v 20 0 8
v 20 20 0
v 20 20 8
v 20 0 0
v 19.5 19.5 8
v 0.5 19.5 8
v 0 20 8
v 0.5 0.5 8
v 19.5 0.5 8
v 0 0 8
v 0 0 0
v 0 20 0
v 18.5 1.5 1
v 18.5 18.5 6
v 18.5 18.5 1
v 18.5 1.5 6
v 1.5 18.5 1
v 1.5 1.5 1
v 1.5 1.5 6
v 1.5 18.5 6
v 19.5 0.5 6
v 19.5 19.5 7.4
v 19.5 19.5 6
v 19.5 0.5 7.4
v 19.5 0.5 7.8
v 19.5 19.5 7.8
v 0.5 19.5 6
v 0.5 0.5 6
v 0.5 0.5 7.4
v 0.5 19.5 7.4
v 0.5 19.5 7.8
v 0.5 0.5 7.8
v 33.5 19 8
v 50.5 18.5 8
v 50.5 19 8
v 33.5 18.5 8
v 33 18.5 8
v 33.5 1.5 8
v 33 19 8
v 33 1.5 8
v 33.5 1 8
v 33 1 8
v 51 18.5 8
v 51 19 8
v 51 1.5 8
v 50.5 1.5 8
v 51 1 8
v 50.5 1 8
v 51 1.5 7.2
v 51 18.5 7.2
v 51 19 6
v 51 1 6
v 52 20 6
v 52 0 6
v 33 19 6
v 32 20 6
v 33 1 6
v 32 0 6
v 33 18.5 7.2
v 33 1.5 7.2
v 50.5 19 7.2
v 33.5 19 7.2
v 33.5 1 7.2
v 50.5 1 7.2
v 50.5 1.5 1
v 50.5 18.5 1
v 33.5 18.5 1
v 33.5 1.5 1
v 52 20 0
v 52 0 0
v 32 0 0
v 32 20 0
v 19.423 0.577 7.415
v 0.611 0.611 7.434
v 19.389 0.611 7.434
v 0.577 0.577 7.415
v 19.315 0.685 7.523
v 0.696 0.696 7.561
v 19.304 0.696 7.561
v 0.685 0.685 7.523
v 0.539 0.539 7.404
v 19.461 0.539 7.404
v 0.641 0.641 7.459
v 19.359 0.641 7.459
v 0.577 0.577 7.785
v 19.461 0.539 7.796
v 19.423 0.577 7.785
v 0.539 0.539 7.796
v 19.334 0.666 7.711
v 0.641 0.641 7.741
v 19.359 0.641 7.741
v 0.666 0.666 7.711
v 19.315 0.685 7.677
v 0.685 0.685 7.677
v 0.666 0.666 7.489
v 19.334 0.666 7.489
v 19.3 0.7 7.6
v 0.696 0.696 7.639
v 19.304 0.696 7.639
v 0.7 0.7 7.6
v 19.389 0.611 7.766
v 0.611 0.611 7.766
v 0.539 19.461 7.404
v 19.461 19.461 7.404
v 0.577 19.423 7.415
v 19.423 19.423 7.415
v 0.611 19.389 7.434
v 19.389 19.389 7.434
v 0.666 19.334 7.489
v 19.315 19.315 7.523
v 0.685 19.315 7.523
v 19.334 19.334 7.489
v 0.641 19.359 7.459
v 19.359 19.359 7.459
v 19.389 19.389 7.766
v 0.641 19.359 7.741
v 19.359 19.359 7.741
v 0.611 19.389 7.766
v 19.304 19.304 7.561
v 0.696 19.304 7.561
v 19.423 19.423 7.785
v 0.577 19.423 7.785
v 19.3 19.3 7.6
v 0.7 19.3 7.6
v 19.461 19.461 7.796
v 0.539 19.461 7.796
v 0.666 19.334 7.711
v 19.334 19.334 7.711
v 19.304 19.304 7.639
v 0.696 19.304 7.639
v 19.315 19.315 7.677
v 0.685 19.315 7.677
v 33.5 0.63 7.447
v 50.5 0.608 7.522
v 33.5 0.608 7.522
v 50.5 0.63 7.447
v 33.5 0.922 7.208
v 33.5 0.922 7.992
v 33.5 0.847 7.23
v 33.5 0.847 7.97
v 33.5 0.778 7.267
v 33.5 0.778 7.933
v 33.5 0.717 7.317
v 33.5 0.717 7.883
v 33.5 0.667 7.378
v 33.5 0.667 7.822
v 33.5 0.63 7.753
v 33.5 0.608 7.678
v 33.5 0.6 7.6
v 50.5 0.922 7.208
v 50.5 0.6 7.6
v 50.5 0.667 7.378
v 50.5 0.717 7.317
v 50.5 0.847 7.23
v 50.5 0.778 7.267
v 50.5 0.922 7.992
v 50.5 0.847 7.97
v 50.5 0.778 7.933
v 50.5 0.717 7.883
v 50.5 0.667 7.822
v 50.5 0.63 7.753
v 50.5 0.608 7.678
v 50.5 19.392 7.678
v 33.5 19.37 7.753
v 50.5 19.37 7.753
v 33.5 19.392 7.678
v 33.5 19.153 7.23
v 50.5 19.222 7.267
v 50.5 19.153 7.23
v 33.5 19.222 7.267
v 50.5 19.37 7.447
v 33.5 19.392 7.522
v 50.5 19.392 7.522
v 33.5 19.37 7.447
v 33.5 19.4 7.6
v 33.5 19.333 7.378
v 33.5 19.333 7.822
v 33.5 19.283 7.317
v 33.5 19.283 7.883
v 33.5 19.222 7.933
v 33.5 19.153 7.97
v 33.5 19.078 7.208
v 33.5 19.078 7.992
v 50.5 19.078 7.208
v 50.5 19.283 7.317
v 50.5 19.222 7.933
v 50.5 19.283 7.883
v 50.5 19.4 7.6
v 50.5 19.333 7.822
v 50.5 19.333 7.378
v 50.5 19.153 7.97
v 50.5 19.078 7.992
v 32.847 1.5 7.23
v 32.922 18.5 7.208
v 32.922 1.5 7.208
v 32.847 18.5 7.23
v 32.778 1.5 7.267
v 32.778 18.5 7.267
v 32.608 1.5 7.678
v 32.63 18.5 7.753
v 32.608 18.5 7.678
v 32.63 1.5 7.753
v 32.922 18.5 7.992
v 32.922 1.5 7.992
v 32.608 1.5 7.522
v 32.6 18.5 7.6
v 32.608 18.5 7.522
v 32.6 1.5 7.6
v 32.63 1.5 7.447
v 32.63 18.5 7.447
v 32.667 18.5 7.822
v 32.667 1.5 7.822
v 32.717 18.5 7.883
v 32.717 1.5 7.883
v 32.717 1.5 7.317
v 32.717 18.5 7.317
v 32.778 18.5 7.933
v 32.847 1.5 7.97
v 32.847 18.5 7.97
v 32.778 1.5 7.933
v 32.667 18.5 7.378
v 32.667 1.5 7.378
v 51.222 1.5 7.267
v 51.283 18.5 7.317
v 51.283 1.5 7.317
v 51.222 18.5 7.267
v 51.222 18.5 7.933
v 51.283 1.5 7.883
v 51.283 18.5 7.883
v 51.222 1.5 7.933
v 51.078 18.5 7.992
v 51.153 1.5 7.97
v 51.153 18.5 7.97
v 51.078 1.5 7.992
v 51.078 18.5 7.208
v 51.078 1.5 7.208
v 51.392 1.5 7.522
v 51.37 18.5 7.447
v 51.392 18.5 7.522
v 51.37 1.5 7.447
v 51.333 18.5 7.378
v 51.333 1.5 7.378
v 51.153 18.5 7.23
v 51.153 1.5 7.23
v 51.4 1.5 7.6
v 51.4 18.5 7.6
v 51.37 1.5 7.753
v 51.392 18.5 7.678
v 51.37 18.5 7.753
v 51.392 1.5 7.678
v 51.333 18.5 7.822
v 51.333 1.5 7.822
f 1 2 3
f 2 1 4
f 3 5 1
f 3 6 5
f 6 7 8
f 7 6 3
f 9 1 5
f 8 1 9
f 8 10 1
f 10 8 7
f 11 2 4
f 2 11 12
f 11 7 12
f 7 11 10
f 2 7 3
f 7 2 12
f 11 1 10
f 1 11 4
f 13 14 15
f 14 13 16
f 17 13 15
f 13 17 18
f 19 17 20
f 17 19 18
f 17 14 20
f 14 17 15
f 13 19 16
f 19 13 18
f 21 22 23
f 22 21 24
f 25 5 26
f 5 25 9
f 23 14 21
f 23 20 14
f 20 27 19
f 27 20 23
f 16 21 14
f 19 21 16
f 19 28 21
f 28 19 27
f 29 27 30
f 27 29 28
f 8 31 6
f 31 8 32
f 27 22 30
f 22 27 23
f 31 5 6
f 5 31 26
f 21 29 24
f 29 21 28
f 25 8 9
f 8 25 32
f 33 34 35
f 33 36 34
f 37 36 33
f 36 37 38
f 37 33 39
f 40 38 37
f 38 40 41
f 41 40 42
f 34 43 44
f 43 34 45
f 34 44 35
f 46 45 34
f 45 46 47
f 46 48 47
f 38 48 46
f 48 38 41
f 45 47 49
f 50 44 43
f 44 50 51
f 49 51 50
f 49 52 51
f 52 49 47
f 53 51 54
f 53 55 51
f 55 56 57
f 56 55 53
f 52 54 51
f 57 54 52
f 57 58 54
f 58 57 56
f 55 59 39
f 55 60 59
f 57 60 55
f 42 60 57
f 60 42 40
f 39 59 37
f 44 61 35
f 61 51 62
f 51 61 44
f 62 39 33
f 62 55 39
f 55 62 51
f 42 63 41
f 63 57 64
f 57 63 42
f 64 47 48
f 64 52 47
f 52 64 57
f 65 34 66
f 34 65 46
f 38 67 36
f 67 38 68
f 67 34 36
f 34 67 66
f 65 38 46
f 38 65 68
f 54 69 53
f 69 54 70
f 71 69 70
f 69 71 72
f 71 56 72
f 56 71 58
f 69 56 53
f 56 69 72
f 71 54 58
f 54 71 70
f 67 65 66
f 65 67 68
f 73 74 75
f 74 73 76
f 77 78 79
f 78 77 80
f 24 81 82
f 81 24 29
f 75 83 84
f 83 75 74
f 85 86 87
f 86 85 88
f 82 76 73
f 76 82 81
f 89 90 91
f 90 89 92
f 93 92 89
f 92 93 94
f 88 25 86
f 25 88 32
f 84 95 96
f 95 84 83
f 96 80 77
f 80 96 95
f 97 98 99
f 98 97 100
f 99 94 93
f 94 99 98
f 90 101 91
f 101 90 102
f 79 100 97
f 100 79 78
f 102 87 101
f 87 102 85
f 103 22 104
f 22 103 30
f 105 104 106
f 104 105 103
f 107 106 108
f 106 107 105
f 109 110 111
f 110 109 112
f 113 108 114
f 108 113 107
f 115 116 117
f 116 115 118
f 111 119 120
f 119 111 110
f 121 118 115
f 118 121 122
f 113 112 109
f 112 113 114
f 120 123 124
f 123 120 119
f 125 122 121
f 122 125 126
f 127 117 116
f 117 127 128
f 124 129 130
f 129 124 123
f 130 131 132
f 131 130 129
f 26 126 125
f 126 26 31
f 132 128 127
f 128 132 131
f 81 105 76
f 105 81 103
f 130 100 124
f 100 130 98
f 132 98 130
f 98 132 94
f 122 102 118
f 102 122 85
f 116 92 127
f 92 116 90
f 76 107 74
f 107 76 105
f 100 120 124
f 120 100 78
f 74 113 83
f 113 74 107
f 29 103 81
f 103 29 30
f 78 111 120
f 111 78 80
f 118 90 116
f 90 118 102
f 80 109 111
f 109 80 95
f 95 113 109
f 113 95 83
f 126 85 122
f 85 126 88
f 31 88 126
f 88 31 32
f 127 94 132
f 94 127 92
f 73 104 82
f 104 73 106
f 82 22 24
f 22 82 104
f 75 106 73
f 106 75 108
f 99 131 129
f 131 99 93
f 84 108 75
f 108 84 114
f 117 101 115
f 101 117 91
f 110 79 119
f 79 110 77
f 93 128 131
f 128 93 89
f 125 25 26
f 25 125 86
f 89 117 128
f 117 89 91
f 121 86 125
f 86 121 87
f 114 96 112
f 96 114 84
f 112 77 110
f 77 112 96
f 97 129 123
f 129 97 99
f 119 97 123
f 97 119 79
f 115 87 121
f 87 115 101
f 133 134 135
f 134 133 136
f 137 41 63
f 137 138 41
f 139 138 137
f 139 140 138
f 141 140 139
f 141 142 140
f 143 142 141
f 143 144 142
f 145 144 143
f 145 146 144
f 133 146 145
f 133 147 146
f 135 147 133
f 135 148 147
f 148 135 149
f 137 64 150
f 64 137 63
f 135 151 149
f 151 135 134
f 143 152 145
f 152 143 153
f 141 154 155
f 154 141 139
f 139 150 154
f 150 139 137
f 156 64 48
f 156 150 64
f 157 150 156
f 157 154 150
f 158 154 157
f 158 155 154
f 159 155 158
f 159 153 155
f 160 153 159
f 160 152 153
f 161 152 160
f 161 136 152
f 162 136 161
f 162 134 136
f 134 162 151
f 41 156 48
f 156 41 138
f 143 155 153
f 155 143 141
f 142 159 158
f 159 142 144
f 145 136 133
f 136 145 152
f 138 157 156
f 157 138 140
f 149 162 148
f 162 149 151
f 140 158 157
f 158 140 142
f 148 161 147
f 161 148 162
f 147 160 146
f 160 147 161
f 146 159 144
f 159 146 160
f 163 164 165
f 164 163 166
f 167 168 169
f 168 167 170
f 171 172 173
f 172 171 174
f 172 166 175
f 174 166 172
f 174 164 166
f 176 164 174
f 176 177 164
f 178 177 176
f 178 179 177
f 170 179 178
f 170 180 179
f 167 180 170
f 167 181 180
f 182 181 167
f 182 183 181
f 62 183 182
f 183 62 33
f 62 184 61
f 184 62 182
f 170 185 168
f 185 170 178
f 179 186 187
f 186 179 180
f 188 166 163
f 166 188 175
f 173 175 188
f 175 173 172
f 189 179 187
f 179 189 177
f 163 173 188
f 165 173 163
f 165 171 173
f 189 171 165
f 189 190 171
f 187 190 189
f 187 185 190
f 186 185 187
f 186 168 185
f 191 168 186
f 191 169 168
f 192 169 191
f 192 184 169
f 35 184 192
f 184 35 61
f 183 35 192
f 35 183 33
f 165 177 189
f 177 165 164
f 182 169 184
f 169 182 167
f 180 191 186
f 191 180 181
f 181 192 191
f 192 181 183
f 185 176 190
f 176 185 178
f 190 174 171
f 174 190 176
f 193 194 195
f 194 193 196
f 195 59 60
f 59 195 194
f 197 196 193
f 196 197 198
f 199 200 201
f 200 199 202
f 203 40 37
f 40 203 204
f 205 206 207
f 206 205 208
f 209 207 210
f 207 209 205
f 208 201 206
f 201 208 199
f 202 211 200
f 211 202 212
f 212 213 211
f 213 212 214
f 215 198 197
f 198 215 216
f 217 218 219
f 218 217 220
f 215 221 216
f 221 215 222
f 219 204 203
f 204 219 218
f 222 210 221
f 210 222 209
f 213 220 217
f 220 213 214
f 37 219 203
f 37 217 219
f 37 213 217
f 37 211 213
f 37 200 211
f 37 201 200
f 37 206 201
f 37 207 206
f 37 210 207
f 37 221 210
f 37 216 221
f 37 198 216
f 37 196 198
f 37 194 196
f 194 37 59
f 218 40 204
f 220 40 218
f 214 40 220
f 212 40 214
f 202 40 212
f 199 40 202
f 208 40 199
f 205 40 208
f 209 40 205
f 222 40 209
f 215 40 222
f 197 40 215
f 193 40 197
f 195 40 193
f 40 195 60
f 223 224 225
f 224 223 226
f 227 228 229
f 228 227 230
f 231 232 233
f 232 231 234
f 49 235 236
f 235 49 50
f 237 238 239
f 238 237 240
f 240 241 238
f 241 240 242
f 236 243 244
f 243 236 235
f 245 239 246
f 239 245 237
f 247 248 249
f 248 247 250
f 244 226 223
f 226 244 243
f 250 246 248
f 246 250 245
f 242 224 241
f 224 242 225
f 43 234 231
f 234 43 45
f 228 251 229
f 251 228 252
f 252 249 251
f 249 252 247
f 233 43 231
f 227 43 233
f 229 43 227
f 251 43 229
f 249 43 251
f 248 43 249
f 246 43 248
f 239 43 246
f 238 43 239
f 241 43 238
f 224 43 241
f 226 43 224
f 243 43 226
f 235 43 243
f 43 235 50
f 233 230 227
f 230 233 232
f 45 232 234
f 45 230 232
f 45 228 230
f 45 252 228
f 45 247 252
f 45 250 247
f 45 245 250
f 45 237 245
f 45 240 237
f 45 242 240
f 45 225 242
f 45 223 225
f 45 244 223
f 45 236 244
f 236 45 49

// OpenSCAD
$fn = 32;

difference() {
    cube([20,20,8]);
    translate([1.5,1.5,1])
    cube([17,17,18]);
    translate([0.5,0.5,6])
    cube([19,19,9]);
}

module thing() {
    intersection() {
        cube([20,20,8]);
        translate([1,1,6])
        cube([18,18,2]);
    }
}

translate([32,0,0])
difference() {
    thing();
    translate([1.5,1.5,0])
    cube([17,17,20]);
}


translate([32,0,0])
difference() {
    cube([20,20,6]);
    translate([1.5,1.5,1])
    cube([17,17,8]);
    //translate([0.5,0.5,6])
    //cube([9,9,9]);
}

// Left in
translate([0,0.5,7.6])
rotate([0,90,0])
cylinder(h=20,r1=0.2, r2=0.2);

// Right in
translate([0,19.5,7.6])
rotate([0,90,0])
cylinder(h=20,r1=0.2, r2=0.2);

// Top in 
translate([0.5,0,7.6])
rotate([0,90,90])
cylinder(h=20,r1=0.2, r2=0.2);

// Bottom in
translate([19.5,0,7.6])
rotate([0,90,90])
cylinder(h=20,r1=0.2, r2=0.2);

// Left out
translate([33.5,1,7.6])
rotate([0,90,0])
cylinder(h=17,r1=0.4, r2=0.4);

// Right out
translate([33.5,19,7.6])
rotate([0,90,0])
cylinder(h=17,r1=0.4, r2=0.4);

// Top out
translate([33,1.5,7.6])
rotate([0,90,90])
cylinder(h=17,r1=0.4, r2=0.4);

// Bottom out
translate([51,1.5,7.6])
rotate([0,90,90])
cylinder(h=17,r1=0.4, r2=0.4);

//color("red")
//translate([32.5,0.5,7])
//cube(1);
